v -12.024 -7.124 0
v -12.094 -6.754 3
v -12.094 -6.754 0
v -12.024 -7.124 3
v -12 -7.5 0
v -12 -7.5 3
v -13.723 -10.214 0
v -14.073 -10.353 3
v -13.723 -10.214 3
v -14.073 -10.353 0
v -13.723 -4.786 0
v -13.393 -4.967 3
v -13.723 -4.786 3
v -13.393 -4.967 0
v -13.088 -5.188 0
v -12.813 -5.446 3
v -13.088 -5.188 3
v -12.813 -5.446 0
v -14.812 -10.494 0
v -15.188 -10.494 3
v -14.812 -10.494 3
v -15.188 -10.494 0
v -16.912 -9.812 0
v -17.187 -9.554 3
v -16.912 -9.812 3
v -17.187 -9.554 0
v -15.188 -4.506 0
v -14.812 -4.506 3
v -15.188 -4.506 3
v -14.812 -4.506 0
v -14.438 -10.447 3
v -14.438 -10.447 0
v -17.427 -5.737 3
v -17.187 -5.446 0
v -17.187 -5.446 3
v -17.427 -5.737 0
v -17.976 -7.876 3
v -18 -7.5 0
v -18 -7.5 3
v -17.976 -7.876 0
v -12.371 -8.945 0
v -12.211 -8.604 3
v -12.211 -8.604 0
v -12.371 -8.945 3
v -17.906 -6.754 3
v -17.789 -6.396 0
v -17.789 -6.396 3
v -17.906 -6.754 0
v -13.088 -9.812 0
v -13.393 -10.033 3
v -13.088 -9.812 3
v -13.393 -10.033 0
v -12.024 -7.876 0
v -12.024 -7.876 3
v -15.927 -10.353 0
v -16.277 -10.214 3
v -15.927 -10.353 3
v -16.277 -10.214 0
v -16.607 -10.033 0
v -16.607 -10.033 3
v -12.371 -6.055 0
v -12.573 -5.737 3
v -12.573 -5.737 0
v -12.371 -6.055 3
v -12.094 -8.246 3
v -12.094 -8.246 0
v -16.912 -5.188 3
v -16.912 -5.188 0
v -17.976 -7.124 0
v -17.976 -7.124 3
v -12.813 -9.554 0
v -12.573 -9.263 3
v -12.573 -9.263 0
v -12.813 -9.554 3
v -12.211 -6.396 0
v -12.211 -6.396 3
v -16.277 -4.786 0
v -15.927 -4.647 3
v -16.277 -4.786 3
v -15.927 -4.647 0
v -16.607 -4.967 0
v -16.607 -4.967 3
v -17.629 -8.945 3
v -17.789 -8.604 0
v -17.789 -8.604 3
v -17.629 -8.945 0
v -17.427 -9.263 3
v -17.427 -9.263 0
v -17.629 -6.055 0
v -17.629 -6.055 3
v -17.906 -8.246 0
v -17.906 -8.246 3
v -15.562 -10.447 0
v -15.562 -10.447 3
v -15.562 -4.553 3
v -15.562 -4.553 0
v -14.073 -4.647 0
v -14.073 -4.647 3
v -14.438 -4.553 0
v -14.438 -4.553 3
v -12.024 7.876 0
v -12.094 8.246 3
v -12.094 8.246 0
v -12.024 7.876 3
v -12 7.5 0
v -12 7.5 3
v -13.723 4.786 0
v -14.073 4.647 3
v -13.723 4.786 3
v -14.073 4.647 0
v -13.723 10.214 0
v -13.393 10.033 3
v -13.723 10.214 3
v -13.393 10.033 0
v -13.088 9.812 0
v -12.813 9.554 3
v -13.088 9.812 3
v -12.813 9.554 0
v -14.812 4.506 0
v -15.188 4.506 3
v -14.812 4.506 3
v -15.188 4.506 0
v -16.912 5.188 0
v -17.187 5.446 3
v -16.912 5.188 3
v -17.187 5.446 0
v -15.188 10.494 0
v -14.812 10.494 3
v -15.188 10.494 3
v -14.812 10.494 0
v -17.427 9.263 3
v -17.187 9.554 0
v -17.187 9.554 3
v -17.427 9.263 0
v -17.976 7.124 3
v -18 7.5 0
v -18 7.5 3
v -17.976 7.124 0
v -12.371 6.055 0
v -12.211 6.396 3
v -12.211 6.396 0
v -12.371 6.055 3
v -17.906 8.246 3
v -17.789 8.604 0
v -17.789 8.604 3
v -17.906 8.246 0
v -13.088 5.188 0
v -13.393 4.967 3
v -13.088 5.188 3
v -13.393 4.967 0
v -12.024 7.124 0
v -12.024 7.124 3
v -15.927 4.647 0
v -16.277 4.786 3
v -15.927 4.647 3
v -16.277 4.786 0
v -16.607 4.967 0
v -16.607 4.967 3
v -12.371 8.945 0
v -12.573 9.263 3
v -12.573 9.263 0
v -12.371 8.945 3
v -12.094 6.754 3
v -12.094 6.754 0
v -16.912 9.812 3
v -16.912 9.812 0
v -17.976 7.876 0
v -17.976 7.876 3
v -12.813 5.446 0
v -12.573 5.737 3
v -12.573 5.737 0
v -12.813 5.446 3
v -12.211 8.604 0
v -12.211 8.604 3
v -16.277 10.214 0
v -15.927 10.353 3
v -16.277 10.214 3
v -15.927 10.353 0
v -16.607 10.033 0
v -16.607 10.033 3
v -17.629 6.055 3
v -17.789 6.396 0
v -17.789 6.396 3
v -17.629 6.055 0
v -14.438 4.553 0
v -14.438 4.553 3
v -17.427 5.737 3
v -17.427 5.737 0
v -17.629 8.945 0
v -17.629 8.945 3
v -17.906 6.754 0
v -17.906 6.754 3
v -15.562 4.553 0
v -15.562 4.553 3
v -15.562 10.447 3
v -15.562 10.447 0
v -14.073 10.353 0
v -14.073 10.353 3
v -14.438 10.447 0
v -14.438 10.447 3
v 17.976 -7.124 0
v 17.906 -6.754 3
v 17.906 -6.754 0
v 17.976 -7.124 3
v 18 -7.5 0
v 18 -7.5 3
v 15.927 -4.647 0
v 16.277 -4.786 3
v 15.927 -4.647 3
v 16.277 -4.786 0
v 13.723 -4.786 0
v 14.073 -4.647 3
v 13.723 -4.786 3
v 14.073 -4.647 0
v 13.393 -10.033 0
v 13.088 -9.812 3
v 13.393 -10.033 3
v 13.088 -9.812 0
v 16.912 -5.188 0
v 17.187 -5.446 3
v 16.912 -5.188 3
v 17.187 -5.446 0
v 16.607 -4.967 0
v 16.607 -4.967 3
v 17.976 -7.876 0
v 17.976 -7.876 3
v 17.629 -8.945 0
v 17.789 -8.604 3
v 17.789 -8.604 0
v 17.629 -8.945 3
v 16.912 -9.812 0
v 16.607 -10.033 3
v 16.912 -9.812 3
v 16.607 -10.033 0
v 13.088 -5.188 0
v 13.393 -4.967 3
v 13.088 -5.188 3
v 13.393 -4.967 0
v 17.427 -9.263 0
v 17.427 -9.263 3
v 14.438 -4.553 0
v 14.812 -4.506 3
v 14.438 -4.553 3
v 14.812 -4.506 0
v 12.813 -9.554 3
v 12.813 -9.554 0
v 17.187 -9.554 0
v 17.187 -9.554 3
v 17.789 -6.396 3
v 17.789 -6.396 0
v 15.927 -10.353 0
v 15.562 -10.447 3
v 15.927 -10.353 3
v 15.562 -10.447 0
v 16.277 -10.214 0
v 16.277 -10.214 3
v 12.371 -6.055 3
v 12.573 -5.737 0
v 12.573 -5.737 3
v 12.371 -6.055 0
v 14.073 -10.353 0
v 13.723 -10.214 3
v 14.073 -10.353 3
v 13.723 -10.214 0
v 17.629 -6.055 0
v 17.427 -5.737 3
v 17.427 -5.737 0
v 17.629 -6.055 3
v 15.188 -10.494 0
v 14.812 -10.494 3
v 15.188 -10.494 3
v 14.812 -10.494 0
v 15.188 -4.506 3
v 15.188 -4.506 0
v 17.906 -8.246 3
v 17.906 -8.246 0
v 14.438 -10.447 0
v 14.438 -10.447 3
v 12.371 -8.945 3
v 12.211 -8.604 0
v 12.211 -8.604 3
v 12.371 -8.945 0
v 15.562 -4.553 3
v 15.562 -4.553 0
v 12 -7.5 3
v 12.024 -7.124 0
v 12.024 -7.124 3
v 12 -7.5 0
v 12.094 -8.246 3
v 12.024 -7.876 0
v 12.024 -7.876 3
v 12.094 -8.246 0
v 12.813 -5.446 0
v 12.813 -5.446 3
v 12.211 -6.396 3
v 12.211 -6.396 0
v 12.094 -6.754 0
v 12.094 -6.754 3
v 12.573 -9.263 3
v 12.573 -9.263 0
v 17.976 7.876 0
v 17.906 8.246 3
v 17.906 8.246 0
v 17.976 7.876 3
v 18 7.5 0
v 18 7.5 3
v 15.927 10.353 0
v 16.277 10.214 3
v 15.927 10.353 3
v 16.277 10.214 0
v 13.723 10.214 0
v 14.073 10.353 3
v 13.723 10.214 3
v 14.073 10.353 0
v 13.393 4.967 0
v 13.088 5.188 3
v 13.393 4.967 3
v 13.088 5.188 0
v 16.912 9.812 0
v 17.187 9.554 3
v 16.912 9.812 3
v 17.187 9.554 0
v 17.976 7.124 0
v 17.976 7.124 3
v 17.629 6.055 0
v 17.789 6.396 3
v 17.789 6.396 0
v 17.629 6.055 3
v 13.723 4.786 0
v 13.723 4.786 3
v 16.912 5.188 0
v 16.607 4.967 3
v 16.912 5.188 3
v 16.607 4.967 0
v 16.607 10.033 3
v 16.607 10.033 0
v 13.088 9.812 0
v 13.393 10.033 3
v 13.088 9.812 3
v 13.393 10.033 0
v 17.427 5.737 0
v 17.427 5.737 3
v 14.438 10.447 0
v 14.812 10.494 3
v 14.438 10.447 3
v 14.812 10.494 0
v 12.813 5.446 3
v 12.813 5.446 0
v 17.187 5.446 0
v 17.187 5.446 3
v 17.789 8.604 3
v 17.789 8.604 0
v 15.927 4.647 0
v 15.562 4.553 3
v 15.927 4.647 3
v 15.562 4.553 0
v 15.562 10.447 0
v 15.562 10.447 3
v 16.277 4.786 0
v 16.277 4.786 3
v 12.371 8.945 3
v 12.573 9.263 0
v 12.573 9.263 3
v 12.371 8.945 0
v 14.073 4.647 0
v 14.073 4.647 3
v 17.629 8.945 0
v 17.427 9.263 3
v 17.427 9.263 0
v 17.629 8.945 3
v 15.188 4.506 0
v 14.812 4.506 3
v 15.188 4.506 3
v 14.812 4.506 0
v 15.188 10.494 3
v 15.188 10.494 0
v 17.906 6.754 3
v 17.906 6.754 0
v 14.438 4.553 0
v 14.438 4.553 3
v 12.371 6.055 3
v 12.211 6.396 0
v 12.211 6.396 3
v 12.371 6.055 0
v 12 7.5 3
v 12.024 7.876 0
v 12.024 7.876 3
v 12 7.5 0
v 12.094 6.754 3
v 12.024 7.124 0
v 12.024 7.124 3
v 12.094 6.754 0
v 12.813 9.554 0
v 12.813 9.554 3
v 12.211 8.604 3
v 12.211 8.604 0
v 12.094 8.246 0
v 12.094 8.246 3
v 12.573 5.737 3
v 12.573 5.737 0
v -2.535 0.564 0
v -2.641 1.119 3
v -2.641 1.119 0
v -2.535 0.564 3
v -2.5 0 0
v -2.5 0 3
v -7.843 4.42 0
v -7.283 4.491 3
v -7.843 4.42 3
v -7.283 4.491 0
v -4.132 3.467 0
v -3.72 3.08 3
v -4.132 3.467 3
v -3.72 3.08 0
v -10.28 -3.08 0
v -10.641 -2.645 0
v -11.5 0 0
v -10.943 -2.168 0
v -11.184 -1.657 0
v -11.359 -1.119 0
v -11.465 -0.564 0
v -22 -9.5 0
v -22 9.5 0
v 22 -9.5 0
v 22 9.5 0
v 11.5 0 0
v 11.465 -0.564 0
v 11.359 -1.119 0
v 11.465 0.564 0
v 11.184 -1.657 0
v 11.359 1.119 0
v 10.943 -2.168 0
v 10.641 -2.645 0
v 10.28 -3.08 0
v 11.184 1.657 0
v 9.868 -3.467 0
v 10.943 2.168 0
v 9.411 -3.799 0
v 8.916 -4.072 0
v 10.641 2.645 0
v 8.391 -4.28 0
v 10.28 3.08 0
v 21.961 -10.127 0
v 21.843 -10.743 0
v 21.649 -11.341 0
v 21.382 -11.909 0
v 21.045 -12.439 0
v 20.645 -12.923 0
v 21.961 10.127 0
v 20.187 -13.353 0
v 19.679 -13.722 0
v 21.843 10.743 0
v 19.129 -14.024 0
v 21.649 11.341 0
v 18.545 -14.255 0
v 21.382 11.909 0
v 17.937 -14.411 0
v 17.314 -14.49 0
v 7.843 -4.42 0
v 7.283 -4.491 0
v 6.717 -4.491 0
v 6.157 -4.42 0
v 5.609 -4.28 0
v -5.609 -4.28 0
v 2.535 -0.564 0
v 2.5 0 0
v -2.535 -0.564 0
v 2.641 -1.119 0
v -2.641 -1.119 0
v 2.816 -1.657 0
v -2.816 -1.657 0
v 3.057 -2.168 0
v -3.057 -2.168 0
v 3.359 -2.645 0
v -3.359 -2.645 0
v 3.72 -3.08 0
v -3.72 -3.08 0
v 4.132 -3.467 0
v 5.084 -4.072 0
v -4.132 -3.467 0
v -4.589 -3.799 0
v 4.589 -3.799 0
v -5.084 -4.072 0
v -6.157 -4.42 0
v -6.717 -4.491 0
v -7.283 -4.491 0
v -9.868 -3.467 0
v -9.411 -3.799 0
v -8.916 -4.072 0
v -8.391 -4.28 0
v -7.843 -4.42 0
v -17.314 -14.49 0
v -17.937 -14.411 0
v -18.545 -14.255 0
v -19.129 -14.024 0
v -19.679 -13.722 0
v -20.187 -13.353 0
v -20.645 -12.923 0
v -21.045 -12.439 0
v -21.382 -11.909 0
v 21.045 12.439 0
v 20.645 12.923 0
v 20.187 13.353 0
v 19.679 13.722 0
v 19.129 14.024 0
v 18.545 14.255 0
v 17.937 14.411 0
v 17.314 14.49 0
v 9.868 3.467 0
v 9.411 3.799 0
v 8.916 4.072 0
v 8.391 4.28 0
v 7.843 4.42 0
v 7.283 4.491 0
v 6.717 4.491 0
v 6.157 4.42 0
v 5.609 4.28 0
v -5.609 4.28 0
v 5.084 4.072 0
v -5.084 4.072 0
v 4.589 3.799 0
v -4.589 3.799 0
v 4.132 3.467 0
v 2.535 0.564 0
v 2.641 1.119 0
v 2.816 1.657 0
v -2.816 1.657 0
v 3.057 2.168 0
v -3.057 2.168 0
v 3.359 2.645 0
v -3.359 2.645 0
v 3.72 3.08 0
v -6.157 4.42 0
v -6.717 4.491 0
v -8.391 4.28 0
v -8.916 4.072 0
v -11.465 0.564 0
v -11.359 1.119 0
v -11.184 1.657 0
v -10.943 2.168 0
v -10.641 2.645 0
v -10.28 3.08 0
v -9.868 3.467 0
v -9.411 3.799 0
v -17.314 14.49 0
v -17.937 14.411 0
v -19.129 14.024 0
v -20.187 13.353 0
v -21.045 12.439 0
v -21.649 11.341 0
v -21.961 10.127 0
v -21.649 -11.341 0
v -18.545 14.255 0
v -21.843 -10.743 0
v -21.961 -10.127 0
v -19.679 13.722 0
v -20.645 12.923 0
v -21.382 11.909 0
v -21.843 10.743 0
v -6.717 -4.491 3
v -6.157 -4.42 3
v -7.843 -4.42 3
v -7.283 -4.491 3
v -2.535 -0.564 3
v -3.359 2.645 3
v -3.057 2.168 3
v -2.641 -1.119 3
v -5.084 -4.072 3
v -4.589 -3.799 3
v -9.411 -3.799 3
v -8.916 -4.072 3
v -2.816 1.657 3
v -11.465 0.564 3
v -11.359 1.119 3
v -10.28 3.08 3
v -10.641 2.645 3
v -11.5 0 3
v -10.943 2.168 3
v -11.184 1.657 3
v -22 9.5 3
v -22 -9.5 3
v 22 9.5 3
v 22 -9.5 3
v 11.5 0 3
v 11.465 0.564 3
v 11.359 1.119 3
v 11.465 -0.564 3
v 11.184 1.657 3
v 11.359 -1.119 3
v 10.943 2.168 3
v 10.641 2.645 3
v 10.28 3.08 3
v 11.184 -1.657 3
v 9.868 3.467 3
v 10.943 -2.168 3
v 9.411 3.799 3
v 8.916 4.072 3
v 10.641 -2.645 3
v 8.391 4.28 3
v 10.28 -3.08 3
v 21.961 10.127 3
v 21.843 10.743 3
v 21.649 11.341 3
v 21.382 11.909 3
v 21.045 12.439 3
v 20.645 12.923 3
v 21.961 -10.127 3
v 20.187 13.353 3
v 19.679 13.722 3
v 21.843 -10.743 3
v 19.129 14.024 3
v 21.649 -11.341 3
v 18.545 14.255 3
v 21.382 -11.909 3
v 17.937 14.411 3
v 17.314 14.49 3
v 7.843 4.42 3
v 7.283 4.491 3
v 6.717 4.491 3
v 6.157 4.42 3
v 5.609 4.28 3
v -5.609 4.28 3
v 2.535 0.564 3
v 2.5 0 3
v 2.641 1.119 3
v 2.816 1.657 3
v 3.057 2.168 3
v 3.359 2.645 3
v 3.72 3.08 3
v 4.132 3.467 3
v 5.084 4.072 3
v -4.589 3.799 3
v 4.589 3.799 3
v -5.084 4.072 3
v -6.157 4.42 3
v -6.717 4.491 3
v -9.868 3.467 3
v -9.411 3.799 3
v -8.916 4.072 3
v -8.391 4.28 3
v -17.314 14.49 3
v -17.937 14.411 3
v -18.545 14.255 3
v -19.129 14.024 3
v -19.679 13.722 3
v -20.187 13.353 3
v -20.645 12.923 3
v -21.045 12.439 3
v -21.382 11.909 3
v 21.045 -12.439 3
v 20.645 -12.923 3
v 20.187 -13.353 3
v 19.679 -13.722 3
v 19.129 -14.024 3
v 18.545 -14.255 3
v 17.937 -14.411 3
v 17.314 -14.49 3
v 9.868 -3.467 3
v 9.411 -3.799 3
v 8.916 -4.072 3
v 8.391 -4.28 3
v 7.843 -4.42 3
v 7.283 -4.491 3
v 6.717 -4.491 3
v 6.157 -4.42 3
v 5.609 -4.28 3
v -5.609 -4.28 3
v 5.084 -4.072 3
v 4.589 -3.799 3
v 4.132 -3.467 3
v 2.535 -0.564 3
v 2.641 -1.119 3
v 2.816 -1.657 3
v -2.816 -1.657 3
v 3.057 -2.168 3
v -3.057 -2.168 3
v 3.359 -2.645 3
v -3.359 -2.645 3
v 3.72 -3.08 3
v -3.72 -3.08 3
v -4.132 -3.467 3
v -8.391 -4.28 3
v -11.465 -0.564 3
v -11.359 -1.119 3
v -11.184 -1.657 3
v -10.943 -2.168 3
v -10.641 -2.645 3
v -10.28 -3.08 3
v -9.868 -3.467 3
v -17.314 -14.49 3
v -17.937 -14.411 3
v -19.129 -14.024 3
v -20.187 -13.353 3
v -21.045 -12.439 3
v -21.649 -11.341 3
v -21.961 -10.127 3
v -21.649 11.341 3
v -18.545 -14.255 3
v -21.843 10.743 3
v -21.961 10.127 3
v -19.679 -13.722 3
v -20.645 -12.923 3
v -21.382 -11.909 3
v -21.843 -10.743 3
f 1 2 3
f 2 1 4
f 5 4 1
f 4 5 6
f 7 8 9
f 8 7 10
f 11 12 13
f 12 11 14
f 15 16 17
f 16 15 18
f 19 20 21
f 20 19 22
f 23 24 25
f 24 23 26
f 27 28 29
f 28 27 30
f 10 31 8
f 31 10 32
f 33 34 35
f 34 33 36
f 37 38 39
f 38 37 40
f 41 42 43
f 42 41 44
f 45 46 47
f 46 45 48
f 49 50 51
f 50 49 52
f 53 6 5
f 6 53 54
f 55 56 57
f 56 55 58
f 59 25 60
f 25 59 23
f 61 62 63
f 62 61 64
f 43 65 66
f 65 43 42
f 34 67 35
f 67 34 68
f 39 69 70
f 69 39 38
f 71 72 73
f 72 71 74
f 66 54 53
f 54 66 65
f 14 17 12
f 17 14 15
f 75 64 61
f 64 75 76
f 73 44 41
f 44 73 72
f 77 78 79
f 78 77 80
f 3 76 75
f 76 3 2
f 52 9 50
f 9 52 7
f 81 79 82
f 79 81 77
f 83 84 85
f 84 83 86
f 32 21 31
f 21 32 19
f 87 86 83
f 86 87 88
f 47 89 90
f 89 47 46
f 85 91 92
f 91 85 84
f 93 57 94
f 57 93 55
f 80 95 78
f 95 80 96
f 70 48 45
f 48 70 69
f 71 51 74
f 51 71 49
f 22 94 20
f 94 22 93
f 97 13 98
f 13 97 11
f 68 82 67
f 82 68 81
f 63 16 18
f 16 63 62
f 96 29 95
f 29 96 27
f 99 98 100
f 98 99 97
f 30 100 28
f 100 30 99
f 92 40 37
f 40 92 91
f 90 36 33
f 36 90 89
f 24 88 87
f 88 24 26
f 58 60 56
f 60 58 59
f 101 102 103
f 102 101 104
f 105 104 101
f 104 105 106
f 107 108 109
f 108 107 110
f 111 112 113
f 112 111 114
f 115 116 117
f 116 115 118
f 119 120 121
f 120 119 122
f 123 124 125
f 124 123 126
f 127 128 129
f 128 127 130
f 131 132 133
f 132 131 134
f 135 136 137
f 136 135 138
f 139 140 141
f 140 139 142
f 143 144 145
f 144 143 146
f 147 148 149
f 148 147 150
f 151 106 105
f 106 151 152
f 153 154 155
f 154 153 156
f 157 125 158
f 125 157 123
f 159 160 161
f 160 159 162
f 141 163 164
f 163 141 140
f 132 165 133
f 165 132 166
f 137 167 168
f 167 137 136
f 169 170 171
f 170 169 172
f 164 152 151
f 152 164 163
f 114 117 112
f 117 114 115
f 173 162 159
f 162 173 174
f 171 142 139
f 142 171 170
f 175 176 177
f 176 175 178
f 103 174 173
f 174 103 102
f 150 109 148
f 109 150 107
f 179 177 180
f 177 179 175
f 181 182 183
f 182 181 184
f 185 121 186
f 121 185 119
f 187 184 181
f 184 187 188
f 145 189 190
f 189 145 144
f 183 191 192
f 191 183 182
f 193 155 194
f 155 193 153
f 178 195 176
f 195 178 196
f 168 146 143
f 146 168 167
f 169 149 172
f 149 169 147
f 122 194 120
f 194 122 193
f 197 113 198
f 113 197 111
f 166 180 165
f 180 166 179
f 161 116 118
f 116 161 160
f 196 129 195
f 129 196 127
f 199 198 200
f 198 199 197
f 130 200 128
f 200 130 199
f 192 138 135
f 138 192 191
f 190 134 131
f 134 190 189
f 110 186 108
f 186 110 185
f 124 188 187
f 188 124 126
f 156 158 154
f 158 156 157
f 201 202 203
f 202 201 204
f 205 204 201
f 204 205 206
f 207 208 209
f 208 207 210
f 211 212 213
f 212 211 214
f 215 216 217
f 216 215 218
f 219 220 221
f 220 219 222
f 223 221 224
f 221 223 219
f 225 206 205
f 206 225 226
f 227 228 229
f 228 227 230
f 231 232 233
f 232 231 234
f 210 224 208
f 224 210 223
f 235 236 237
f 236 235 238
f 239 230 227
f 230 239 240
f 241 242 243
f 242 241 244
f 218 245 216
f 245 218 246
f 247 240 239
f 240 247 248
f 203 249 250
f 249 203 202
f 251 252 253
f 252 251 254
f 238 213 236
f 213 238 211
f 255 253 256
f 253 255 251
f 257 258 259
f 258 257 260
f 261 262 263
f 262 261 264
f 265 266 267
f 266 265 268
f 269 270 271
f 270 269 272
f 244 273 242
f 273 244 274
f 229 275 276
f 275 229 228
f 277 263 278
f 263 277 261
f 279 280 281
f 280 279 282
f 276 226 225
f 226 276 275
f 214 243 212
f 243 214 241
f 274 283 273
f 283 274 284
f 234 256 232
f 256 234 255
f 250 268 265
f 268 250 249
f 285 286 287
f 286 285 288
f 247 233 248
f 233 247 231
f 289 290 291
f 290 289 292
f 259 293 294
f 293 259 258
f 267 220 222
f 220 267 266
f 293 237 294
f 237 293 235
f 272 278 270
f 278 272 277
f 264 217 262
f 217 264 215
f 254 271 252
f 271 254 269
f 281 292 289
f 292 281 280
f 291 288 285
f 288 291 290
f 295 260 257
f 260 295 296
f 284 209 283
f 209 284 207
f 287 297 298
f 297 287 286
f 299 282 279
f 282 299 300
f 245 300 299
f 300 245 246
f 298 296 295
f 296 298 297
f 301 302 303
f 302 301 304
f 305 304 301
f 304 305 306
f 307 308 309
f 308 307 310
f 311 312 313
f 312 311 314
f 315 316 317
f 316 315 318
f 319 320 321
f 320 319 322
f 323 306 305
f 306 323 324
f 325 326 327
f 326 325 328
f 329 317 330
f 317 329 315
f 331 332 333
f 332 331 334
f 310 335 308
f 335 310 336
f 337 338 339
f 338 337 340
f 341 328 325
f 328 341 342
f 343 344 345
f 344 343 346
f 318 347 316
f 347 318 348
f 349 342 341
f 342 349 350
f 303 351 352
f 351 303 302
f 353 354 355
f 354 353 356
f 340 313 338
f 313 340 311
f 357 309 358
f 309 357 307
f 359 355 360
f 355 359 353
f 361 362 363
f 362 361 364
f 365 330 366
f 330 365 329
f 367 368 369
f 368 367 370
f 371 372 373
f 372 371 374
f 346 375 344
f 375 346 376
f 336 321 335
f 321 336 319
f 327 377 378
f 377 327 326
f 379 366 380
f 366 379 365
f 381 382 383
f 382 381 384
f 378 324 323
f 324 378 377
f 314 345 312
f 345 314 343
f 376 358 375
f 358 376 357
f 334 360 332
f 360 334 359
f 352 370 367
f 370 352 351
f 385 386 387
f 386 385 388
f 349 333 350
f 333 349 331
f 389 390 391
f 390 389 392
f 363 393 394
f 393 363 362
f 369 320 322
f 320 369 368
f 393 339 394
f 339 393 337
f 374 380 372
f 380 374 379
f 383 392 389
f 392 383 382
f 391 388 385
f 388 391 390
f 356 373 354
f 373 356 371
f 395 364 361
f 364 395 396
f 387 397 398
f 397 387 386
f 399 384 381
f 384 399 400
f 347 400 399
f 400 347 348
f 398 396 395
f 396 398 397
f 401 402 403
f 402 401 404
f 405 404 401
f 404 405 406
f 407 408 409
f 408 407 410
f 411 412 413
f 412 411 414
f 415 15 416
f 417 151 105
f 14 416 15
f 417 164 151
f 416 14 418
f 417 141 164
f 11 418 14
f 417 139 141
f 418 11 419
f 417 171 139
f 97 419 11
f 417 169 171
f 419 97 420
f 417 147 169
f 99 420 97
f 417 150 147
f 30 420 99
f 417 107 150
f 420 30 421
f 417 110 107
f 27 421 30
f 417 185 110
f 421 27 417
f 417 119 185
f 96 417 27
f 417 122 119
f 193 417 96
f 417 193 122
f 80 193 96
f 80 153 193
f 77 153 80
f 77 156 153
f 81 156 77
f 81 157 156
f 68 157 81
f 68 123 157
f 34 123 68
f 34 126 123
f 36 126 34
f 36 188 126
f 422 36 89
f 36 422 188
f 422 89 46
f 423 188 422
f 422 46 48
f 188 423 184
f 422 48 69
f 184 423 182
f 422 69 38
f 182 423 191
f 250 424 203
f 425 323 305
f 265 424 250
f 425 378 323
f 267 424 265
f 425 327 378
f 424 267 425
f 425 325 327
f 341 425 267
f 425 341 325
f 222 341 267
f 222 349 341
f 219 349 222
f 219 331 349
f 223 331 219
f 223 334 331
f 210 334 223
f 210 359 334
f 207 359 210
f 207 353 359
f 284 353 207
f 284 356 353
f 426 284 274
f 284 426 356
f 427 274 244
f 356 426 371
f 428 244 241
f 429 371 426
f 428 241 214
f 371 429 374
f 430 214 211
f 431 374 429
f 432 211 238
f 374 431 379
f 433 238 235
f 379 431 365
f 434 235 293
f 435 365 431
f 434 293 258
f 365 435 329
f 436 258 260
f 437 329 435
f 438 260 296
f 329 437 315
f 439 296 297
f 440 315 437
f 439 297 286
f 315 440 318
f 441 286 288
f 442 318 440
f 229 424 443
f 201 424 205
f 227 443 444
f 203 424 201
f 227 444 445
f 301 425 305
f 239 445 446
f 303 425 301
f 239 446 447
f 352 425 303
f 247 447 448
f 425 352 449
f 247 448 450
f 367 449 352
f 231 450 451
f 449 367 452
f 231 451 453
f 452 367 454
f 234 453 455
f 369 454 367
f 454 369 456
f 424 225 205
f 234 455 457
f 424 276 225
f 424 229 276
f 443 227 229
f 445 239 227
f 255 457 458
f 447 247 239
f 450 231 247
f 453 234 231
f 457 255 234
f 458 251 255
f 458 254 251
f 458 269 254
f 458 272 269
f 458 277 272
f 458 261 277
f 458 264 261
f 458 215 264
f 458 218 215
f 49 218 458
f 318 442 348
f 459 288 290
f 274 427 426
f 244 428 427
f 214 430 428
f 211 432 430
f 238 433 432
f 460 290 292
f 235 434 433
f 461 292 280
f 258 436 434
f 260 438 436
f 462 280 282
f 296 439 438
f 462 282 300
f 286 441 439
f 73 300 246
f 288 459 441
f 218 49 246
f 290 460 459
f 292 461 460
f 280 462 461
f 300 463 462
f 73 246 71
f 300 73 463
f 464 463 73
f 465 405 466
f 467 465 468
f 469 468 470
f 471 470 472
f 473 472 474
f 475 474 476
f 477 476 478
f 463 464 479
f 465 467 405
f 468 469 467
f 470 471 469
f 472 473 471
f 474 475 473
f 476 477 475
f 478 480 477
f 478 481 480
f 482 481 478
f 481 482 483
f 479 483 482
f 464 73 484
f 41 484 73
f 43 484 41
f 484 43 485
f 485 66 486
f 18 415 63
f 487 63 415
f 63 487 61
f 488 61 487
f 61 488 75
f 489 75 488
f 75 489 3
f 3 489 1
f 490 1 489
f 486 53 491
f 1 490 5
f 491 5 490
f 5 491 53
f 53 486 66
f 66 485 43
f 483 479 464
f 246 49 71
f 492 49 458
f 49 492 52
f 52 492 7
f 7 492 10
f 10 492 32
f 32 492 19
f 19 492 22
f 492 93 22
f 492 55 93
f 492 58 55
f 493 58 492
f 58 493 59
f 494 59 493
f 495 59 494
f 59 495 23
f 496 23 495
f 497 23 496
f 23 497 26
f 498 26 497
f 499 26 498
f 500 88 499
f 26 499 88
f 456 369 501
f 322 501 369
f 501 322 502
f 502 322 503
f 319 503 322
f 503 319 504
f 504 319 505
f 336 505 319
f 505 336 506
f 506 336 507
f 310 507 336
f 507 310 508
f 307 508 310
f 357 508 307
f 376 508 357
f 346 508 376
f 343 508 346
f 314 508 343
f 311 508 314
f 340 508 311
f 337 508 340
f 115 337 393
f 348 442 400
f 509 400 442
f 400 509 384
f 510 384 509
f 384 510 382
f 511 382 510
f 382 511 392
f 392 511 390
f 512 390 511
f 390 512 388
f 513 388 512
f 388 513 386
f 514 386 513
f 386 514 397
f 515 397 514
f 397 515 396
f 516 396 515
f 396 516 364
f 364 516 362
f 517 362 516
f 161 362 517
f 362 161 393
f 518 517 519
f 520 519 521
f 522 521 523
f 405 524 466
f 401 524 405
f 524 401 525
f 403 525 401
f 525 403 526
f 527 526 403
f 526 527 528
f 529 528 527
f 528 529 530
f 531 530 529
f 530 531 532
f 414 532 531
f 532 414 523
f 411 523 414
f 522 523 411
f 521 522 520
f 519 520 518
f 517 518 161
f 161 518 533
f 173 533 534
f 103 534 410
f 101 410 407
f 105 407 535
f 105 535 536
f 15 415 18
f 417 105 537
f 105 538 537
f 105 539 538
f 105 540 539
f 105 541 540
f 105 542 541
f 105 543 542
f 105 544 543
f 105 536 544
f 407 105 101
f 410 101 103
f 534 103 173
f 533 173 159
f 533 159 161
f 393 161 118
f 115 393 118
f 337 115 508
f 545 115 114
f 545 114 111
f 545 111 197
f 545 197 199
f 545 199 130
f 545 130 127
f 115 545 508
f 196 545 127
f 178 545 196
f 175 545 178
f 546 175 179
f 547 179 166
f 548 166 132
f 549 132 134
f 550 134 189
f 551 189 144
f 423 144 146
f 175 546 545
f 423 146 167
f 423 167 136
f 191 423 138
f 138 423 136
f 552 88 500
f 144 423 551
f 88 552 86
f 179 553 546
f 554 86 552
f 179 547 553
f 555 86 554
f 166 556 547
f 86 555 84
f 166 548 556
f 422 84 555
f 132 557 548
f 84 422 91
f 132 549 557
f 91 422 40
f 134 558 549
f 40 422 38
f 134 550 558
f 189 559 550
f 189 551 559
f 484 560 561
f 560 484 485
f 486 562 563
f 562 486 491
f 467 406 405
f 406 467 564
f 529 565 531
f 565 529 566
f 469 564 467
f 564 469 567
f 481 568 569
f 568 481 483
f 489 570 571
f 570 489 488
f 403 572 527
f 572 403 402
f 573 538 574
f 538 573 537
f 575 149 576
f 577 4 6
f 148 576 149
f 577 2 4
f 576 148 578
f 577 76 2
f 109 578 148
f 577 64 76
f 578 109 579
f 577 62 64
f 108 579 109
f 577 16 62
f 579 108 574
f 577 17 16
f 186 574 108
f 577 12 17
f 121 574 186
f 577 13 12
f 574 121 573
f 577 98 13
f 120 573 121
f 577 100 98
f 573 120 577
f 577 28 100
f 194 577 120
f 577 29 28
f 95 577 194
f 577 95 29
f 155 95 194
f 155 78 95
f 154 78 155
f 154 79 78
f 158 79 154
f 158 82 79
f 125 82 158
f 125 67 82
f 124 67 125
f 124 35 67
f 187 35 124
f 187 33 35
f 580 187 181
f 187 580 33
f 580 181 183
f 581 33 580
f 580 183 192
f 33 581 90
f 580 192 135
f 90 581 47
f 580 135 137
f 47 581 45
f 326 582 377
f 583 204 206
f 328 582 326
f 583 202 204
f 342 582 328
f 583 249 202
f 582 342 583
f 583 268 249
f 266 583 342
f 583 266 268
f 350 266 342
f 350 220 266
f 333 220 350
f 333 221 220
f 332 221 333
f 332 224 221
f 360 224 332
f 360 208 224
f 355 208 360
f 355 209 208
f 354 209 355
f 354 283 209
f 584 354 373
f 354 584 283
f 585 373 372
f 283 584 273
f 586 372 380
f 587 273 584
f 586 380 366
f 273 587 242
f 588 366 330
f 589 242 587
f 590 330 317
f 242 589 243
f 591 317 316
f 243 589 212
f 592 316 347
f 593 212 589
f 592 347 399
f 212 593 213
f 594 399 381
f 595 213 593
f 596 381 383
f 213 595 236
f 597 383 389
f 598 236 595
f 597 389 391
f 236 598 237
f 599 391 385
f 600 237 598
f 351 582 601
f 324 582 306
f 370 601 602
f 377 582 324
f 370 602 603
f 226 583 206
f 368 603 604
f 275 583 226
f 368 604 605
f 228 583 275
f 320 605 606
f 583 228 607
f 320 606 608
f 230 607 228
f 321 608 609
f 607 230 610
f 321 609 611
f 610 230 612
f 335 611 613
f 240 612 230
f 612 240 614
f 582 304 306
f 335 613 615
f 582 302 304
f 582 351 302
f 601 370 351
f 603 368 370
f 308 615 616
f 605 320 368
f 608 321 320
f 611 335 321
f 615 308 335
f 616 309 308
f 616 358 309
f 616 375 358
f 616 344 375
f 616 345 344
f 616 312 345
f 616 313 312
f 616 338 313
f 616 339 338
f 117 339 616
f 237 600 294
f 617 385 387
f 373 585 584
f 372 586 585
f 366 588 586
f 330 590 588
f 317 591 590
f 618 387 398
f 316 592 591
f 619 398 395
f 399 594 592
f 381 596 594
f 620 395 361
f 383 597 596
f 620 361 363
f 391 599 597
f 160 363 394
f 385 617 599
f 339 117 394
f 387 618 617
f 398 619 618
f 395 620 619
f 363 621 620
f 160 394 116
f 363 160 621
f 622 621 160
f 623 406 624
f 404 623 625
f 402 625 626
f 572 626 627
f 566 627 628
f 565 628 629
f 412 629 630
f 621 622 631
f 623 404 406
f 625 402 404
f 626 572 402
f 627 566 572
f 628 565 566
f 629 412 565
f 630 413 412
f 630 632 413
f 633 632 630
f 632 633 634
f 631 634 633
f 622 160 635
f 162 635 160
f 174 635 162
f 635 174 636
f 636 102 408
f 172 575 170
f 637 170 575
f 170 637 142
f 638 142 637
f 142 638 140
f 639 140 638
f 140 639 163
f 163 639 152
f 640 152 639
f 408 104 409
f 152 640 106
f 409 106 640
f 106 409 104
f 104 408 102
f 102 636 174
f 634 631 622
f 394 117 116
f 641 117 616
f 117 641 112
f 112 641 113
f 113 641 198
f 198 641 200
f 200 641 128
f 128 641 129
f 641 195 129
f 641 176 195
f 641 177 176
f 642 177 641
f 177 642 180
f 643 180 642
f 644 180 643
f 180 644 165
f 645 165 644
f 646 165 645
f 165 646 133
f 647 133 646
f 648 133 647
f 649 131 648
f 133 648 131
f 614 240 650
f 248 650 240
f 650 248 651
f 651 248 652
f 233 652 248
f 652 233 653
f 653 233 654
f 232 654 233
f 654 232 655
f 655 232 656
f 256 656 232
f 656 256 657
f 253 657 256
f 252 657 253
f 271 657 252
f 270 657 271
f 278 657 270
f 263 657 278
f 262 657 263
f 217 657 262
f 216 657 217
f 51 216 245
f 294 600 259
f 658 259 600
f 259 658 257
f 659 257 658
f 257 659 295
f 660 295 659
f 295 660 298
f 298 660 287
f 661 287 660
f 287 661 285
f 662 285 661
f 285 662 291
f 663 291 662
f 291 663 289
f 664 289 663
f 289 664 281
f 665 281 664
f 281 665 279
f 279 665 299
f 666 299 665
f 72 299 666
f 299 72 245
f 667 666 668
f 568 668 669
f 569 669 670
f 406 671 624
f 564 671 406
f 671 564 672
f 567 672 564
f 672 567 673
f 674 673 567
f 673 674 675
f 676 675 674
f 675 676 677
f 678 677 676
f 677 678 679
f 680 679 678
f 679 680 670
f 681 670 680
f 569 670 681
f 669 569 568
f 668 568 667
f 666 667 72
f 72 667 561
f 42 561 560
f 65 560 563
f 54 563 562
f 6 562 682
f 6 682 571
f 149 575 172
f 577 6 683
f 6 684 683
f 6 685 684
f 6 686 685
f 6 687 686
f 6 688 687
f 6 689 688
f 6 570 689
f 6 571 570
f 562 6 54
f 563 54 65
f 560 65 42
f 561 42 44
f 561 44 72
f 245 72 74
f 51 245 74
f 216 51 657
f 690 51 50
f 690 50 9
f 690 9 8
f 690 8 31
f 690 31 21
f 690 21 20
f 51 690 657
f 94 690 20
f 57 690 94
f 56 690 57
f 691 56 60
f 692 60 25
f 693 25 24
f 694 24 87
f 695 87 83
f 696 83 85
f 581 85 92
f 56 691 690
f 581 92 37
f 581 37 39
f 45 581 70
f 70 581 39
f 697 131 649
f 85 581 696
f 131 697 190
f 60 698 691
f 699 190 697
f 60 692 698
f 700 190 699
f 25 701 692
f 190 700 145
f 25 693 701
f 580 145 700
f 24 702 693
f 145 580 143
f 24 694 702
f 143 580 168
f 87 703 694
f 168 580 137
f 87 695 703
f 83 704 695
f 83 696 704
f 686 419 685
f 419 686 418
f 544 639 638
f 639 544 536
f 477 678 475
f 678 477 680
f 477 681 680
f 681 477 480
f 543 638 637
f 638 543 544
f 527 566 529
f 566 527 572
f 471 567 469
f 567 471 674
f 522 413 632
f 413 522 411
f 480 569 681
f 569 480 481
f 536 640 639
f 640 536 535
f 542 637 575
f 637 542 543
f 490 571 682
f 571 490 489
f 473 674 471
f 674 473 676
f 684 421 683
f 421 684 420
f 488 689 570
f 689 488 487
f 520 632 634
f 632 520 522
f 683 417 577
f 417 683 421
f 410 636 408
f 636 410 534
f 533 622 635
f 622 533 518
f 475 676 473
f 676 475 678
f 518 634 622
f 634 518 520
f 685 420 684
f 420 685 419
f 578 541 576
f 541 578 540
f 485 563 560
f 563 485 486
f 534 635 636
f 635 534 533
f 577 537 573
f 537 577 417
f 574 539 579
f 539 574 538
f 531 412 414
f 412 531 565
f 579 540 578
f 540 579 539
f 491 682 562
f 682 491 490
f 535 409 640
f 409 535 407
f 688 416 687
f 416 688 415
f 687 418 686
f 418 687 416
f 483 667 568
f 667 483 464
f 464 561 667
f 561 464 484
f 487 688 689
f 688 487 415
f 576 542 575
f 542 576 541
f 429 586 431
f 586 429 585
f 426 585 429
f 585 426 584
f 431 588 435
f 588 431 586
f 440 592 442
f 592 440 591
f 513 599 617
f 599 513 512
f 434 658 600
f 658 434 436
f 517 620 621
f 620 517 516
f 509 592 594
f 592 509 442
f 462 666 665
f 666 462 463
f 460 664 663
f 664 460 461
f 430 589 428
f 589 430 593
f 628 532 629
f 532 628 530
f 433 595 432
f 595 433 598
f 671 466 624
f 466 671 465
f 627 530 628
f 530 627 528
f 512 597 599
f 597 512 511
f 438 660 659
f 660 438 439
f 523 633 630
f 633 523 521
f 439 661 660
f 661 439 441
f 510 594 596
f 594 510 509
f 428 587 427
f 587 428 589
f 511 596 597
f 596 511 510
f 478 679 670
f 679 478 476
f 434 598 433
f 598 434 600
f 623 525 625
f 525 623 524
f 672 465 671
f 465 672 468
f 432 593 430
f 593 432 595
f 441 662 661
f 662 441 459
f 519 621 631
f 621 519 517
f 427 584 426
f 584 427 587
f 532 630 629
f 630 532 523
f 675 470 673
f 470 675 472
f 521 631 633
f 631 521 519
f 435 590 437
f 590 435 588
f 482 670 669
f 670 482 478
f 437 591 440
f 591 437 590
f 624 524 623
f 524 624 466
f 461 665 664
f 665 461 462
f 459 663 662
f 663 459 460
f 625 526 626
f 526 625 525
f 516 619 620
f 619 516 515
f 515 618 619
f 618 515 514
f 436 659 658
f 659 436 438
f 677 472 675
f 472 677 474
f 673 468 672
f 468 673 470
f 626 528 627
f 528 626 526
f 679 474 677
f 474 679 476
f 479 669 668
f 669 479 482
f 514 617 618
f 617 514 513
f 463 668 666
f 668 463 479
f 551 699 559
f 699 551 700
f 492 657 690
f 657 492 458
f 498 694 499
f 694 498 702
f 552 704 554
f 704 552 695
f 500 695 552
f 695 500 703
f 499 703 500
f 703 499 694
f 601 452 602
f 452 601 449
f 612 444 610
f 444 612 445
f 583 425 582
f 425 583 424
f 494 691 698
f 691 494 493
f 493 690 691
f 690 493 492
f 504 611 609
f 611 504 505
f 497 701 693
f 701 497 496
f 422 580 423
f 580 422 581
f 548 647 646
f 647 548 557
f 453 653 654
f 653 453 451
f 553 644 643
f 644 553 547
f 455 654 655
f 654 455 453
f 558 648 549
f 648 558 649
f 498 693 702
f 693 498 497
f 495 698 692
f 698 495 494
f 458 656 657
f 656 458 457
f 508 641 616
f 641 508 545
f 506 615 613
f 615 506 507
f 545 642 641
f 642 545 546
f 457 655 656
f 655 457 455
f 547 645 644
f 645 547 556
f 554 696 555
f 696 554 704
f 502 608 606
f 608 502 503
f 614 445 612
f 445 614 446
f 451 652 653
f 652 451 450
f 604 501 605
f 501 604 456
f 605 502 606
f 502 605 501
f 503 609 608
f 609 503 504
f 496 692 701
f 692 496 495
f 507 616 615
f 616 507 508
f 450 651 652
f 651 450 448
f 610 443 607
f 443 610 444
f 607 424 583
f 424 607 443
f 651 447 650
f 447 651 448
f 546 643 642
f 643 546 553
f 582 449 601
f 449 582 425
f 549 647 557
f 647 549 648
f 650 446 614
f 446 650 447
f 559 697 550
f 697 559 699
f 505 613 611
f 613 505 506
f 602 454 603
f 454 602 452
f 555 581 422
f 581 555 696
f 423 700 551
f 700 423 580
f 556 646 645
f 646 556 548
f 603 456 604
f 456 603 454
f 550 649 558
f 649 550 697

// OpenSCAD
$fn = 50;


difference() {
	union() {
		hull() {
			translate(v = [-17.0000000000, 9.5000000000, 0]) {
				cylinder(h = 3, r = 5);
			}
			translate(v = [17.0000000000, 9.5000000000, 0]) {
				cylinder(h = 3, r = 5);
			}
			translate(v = [-17.0000000000, -9.5000000000, 0]) {
				cylinder(h = 3, r = 5);
			}
			translate(v = [17.0000000000, -9.5000000000, 0]) {
				cylinder(h = 3, r = 5);
			}
		}
	}
	union() {
		#translate(v = [-15.0000000000, -7.5000000000, -100.0000000000]) {
			cylinder(h = 200, r = 3.0000000000);
		}
		#translate(v = [-15.0000000000, 7.5000000000, -100.0000000000]) {
			cylinder(h = 200, r = 3.0000000000);
		}
		#translate(v = [15.0000000000, -7.5000000000, -100.0000000000]) {
			cylinder(h = 200, r = 3.0000000000);
		}
		#translate(v = [15.0000000000, 7.5000000000, -100.0000000000]) {
			cylinder(h = 200, r = 3.0000000000);
		}
		#translate(v = [-7.0000000000, 0, 0]) {
			cylinder(h = 3, r = 4.5000000000);
		}
		#translate(v = [7.0000000000, 0, 0]) {
			cylinder(h = 3, r = 4.5000000000);
		}
	}
}
